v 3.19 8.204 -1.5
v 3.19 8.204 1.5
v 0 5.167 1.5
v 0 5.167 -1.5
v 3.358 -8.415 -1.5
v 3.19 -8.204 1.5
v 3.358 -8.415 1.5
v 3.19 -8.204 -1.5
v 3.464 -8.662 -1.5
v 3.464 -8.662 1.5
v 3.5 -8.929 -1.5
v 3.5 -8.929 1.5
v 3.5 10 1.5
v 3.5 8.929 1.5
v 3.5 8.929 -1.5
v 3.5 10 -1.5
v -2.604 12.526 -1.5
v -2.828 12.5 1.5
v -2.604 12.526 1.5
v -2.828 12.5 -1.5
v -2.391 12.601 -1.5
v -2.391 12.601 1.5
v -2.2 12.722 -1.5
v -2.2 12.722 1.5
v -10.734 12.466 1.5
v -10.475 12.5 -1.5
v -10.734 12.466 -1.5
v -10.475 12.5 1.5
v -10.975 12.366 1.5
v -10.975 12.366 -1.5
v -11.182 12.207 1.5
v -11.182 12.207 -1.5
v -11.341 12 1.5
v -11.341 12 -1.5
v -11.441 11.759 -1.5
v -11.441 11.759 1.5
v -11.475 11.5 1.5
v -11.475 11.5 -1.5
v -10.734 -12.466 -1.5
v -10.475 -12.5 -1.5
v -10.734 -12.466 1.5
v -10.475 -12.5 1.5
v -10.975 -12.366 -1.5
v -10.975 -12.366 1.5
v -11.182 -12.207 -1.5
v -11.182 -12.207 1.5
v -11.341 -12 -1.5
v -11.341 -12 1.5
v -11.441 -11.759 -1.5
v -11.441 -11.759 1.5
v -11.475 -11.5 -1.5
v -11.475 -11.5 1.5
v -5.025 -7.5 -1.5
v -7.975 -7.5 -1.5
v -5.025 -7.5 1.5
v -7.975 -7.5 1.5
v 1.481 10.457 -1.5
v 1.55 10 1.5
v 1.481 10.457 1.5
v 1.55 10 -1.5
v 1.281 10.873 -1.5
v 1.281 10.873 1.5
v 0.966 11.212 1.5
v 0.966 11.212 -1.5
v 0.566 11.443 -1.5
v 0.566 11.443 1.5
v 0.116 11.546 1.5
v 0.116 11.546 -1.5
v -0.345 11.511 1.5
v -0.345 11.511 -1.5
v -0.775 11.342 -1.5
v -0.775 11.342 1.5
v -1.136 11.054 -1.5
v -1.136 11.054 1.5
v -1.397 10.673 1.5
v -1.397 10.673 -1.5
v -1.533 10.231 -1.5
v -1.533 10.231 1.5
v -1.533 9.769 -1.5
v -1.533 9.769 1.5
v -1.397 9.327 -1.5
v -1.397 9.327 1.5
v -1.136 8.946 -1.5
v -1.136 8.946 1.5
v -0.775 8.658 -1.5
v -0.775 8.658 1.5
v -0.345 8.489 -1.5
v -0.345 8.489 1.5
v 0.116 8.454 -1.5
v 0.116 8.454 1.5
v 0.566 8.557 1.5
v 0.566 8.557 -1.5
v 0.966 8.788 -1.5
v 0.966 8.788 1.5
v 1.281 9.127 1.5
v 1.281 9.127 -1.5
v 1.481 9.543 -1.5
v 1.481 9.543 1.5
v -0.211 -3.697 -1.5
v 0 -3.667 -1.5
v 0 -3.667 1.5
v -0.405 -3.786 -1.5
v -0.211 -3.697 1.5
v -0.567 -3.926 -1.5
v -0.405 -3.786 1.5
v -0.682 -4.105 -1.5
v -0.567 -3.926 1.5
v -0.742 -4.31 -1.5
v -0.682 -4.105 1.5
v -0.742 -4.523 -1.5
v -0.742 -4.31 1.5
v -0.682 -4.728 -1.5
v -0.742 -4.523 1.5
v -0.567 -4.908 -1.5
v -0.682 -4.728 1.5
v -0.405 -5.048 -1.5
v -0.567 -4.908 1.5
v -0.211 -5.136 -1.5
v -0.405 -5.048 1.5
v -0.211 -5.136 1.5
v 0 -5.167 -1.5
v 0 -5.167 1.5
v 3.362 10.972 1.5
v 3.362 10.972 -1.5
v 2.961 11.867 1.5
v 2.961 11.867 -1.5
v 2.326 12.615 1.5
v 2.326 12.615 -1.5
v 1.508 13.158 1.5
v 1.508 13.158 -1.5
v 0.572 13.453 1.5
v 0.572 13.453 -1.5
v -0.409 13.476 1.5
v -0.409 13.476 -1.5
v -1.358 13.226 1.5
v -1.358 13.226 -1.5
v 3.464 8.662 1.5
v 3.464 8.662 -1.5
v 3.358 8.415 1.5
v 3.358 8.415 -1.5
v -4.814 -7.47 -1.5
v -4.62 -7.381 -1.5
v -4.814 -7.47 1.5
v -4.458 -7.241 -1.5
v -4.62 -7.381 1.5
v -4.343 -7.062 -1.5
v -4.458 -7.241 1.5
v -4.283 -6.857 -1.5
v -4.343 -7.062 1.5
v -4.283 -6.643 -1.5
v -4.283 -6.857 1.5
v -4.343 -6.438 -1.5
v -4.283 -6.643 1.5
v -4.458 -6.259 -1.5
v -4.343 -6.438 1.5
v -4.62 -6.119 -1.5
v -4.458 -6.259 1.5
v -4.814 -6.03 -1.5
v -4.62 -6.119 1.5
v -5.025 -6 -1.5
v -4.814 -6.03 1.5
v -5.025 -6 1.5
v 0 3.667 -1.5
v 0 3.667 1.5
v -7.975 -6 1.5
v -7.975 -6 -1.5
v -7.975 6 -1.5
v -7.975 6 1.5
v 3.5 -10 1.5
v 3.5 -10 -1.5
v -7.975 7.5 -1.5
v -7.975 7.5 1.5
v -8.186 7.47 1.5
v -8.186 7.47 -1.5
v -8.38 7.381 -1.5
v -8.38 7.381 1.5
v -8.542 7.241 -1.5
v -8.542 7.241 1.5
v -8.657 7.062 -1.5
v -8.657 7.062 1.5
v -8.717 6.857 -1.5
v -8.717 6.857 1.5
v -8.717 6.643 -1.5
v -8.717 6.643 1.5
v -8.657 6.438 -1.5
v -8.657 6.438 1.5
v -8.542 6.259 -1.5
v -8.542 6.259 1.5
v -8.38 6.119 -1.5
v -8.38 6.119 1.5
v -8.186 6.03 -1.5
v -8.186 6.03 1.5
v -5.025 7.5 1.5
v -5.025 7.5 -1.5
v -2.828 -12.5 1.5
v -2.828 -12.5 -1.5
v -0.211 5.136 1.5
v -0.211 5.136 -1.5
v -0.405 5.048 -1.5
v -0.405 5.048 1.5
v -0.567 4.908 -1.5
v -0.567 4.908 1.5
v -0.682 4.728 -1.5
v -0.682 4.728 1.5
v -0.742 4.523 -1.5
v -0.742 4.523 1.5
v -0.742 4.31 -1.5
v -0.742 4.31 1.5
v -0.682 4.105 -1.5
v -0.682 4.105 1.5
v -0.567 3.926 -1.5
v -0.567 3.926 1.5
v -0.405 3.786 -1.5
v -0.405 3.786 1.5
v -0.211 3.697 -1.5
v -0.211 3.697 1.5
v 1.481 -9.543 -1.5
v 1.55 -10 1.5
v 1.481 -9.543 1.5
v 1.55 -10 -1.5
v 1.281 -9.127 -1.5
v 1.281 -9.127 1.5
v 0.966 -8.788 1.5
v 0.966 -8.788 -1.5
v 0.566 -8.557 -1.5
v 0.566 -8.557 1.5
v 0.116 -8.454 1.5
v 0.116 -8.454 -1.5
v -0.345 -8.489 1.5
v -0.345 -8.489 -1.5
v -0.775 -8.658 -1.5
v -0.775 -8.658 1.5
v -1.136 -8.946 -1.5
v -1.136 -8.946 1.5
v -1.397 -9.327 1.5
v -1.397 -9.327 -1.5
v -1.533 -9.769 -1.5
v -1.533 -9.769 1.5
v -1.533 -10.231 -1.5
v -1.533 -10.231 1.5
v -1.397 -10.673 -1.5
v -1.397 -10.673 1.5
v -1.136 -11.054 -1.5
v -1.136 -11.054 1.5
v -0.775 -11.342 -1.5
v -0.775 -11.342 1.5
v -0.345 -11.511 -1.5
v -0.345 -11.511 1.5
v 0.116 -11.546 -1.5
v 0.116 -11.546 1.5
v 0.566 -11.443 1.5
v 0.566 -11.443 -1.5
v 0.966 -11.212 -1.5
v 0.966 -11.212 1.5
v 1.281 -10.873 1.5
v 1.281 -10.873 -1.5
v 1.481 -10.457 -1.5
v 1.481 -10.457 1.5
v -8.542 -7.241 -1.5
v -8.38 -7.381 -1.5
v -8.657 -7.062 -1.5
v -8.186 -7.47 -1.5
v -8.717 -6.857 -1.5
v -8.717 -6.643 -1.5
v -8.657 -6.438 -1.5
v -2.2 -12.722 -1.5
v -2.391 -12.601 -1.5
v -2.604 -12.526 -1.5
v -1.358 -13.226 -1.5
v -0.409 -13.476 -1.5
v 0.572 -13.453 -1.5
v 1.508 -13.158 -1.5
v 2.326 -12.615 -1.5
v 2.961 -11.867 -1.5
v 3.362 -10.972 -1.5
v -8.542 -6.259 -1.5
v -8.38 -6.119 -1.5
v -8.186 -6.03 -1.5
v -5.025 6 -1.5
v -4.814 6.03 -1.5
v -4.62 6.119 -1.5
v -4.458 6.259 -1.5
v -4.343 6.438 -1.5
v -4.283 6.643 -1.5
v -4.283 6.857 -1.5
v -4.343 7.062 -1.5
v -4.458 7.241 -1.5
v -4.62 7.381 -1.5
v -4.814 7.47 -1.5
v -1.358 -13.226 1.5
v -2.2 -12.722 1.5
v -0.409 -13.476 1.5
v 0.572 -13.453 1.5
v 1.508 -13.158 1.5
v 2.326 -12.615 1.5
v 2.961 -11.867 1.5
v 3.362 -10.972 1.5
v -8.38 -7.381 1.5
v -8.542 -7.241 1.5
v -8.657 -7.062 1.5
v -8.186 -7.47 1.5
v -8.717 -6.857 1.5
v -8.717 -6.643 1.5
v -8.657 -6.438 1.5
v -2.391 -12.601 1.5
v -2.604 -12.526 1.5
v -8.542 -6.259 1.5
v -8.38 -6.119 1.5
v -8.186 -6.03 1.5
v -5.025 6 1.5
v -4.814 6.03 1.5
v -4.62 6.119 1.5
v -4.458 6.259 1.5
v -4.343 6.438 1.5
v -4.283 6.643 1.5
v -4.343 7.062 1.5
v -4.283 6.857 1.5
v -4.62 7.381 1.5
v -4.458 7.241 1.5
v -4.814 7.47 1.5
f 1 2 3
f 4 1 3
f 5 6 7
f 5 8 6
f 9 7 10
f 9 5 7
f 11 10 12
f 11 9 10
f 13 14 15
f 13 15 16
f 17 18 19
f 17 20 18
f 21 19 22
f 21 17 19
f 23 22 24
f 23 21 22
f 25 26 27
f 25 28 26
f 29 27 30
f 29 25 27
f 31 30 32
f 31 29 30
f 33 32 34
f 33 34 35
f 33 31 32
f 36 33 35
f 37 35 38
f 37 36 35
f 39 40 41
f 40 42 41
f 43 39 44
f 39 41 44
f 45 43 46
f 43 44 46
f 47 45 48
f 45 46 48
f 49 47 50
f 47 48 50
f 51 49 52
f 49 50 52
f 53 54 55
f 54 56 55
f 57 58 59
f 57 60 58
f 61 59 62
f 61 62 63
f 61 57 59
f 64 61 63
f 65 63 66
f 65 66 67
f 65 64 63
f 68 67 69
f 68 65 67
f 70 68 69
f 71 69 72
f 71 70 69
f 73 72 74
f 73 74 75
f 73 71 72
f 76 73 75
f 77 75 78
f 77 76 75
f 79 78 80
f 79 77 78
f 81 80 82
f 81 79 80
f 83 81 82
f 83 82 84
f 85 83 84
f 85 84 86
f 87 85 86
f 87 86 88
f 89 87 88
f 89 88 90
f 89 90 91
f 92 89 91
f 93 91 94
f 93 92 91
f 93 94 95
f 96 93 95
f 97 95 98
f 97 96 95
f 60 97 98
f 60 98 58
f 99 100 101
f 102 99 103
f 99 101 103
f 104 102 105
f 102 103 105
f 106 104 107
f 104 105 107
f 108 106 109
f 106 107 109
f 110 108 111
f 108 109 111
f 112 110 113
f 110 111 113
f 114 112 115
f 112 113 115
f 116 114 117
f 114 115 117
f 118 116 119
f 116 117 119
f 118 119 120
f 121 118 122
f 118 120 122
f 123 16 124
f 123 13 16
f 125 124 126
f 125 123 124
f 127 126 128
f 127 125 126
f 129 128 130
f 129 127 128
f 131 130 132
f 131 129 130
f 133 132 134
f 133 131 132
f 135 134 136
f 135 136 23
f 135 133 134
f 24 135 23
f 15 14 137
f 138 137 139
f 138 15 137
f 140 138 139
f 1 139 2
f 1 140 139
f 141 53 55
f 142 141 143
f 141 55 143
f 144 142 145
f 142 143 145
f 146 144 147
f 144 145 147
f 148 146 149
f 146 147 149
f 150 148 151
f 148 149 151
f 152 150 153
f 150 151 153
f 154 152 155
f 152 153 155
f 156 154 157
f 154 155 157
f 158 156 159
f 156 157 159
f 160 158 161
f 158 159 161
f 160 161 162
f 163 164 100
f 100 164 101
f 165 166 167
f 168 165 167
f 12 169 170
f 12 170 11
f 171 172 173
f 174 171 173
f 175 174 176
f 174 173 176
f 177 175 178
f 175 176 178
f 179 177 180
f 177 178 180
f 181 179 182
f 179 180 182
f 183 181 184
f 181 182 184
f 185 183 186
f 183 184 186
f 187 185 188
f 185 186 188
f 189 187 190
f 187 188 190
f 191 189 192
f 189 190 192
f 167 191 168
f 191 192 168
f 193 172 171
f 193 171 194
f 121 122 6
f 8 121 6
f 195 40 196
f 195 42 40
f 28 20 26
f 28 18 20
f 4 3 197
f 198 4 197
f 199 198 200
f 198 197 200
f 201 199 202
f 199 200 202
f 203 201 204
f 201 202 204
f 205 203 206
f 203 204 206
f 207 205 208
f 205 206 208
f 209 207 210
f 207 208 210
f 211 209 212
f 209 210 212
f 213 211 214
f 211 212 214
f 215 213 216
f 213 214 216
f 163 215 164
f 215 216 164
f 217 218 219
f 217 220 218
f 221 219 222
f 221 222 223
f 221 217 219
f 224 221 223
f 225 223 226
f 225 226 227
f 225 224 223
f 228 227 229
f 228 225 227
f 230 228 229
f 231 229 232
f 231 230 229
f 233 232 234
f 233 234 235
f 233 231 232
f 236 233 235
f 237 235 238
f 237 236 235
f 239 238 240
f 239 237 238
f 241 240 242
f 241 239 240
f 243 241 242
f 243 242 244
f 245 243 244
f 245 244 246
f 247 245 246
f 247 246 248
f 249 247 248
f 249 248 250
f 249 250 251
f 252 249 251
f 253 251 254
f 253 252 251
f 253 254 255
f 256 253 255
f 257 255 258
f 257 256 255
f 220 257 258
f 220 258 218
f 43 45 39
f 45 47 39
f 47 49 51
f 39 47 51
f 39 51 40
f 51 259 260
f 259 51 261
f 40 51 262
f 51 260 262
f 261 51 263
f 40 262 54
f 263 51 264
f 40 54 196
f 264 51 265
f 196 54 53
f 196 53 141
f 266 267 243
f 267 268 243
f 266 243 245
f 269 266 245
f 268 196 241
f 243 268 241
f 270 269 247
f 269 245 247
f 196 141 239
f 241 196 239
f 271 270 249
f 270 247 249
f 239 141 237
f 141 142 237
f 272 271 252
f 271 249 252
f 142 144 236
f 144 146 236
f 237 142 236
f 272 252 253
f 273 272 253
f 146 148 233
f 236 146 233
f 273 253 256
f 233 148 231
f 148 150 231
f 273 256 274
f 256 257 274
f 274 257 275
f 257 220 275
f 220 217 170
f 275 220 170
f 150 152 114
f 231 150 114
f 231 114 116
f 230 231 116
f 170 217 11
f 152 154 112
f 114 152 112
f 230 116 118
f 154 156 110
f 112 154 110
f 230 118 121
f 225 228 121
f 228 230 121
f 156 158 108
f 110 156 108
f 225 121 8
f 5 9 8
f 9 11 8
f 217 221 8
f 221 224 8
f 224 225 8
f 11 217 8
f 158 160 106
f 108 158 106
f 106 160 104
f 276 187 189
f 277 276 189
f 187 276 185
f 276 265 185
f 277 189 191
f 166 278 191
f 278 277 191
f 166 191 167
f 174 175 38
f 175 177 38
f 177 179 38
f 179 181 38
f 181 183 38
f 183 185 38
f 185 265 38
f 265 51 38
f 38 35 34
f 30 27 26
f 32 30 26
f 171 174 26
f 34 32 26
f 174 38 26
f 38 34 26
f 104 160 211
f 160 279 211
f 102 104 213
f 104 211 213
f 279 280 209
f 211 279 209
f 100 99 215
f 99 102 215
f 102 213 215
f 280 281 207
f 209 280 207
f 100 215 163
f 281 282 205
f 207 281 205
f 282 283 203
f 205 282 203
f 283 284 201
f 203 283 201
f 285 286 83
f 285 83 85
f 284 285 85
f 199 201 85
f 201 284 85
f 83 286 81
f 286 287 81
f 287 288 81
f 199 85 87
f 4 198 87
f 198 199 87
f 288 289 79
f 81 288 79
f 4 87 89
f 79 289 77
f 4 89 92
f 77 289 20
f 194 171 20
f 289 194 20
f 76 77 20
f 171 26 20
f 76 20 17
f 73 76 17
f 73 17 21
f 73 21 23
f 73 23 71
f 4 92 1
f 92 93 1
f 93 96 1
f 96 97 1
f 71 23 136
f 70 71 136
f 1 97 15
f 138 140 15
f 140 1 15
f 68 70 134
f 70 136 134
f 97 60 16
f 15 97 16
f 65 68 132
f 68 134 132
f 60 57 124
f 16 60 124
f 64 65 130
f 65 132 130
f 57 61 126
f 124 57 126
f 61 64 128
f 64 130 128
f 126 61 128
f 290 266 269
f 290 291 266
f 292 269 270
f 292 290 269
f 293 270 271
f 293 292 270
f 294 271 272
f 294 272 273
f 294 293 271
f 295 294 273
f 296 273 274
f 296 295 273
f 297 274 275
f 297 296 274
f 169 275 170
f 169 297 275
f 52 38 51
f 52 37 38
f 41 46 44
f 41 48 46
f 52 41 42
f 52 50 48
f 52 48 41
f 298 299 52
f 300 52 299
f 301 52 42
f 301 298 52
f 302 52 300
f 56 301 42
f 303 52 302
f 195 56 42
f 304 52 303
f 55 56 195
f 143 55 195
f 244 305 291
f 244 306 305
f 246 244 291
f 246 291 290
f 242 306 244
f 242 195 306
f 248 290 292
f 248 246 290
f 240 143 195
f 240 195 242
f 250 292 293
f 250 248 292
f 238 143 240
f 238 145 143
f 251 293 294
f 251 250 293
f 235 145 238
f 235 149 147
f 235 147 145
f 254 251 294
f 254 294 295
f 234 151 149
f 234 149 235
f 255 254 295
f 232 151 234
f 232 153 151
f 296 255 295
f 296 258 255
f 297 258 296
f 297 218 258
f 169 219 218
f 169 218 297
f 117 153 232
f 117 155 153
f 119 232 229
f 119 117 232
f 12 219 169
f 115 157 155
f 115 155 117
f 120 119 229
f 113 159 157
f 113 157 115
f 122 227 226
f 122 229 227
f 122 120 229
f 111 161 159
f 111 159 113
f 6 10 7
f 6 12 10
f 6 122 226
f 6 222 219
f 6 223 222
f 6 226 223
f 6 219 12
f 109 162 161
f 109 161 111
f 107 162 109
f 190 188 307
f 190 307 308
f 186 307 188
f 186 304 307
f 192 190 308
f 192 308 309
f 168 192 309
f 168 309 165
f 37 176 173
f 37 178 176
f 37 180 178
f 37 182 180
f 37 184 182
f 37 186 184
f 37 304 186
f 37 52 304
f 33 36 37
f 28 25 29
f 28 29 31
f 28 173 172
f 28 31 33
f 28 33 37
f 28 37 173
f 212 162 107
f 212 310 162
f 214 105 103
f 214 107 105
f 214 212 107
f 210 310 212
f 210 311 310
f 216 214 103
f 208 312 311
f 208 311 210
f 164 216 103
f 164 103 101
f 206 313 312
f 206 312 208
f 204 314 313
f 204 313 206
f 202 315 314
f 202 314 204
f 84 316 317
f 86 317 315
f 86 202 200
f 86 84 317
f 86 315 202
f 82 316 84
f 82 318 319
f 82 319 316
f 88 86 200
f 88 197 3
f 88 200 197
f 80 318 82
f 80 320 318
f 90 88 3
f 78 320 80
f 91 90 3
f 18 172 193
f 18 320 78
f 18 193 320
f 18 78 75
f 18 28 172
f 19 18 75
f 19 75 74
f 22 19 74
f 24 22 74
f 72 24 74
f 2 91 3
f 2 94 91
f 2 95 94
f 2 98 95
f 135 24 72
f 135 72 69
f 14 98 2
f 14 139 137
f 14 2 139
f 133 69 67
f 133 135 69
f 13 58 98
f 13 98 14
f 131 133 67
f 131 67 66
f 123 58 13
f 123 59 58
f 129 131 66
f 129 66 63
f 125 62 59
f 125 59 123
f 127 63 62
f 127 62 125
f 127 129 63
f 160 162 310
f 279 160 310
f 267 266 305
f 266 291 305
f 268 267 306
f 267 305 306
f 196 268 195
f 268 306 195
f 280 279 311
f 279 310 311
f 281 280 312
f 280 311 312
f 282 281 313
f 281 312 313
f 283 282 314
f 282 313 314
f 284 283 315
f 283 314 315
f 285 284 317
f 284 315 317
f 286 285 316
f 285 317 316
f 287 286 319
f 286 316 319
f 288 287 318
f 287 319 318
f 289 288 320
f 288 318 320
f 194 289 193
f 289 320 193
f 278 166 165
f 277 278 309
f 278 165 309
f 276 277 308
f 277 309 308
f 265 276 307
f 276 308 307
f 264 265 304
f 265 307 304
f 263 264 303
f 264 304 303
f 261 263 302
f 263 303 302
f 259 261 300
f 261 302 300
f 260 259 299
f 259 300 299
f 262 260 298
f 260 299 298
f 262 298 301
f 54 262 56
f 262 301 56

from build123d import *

# Parameters (mm, degrees)
SKETCH_1_R          = 1.55
SKETCH_1_W          = 2.95
SKETCH_1_H          = 15
EXTRUDE_1_DEPTH     = 1.5
FILLET_1_R          = 1
SKETCH_2_R          = 0.75
CUT_EXTRUDE_1_DEPTH = 4
CUT_EXTRUDE_2_DEPTH = 4
SKETCH_4_R          = 0.75
CUT_EXTRUDE_3_DEPTH = 4
FILLET_2_R          = 1


with BuildPart() as part:
    # 草图1 → 凸台-拉伸1 (new body, symmetric)
    with BuildSketch(Plane.XY):
        with BuildLine():
            Line((-2.449489743, 12.5), (-11.475, 12.5))
            Line((-11.475, 12.5), (-11.475, -12.5))
            Line((-11.475, -12.5), (-2.449489743, -12.5))
            ThreePointArc((-2.449489743, -12.5), (1.355873501, -13.226702194), (3.5, -10))
            Line((3.5, -10), (3.5, 10))
            ThreePointArc((3.5, 10), (1.355873501, 13.226702194), (-2.449489743, 12.5))
        make_face()
        with Locations((0, 10)):
            Circle(SKETCH_1_R, mode=Mode.SUBTRACT)
        with Locations((0, -10)):
            Circle(SKETCH_1_R, mode=Mode.SUBTRACT)
        with Locations((-6.5, 0)):
            Rectangle(SKETCH_1_W, SKETCH_1_H, mode=Mode.SUBTRACT)
    extrude(amount=EXTRUDE_1_DEPTH, both=True)

    # 圆角1
    fillet_1_edges = [part.edges().sort_by_distance(p)[0] for p in [
        (-11.475, -12.5, 0),
        (-11.475, 12.5, 0),
    ]]
    fillet(fillet_1_edges, radius=FILLET_1_R)

    # 草图2 → 切除-拉伸1 (cut, through all)
    with BuildSketch(Plane.XY.offset(1.5)):
        with Locations((-7.975, 6.75)):
            Circle(SKETCH_2_R)
        with Locations((-5.025, 6.75)):
            Circle(SKETCH_2_R)
        with Locations((-7.975, -6.75)):
            Circle(SKETCH_2_R)
        with Locations((-5.025, -6.75)):
            Circle(SKETCH_2_R)
    extrude(amount=-CUT_EXTRUDE_1_DEPTH, mode=Mode.SUBTRACT)

    # 草图3 → 切除-拉伸2 (cut, through all)
    with BuildSketch(Plane.XY.offset(1.5)):
        Polygon((3.5, 8.5), (0, 5.166666667), (0, -5.166666667), (3.5, -8.5), align=None)
    extrude(amount=-CUT_EXTRUDE_2_DEPTH, mode=Mode.SUBTRACT)

    # 草图4 → 切除-拉伸3 (cut, through all)
    with BuildSketch(Plane.XY.offset(1.5)):
        with Locations((0, 4.416666667)):
            Circle(SKETCH_4_R)
        with Locations((0, -4.416666667)):
            Circle(SKETCH_4_R)
    extrude(amount=-CUT_EXTRUDE_3_DEPTH, mode=Mode.SUBTRACT)

    # 圆角2
    fillet_2_edges = [part.edges().sort_by_distance(p)[0] for p in [
        (-2.449489743, 12.5, 0),
        (-2.449489743, -12.5, 0),
        (3.5, 8.5, 0),
        (3.5, -8.5, 0),
    ]]
    fillet(fillet_2_edges, radius=FILLET_2_R)


solid = part.part
